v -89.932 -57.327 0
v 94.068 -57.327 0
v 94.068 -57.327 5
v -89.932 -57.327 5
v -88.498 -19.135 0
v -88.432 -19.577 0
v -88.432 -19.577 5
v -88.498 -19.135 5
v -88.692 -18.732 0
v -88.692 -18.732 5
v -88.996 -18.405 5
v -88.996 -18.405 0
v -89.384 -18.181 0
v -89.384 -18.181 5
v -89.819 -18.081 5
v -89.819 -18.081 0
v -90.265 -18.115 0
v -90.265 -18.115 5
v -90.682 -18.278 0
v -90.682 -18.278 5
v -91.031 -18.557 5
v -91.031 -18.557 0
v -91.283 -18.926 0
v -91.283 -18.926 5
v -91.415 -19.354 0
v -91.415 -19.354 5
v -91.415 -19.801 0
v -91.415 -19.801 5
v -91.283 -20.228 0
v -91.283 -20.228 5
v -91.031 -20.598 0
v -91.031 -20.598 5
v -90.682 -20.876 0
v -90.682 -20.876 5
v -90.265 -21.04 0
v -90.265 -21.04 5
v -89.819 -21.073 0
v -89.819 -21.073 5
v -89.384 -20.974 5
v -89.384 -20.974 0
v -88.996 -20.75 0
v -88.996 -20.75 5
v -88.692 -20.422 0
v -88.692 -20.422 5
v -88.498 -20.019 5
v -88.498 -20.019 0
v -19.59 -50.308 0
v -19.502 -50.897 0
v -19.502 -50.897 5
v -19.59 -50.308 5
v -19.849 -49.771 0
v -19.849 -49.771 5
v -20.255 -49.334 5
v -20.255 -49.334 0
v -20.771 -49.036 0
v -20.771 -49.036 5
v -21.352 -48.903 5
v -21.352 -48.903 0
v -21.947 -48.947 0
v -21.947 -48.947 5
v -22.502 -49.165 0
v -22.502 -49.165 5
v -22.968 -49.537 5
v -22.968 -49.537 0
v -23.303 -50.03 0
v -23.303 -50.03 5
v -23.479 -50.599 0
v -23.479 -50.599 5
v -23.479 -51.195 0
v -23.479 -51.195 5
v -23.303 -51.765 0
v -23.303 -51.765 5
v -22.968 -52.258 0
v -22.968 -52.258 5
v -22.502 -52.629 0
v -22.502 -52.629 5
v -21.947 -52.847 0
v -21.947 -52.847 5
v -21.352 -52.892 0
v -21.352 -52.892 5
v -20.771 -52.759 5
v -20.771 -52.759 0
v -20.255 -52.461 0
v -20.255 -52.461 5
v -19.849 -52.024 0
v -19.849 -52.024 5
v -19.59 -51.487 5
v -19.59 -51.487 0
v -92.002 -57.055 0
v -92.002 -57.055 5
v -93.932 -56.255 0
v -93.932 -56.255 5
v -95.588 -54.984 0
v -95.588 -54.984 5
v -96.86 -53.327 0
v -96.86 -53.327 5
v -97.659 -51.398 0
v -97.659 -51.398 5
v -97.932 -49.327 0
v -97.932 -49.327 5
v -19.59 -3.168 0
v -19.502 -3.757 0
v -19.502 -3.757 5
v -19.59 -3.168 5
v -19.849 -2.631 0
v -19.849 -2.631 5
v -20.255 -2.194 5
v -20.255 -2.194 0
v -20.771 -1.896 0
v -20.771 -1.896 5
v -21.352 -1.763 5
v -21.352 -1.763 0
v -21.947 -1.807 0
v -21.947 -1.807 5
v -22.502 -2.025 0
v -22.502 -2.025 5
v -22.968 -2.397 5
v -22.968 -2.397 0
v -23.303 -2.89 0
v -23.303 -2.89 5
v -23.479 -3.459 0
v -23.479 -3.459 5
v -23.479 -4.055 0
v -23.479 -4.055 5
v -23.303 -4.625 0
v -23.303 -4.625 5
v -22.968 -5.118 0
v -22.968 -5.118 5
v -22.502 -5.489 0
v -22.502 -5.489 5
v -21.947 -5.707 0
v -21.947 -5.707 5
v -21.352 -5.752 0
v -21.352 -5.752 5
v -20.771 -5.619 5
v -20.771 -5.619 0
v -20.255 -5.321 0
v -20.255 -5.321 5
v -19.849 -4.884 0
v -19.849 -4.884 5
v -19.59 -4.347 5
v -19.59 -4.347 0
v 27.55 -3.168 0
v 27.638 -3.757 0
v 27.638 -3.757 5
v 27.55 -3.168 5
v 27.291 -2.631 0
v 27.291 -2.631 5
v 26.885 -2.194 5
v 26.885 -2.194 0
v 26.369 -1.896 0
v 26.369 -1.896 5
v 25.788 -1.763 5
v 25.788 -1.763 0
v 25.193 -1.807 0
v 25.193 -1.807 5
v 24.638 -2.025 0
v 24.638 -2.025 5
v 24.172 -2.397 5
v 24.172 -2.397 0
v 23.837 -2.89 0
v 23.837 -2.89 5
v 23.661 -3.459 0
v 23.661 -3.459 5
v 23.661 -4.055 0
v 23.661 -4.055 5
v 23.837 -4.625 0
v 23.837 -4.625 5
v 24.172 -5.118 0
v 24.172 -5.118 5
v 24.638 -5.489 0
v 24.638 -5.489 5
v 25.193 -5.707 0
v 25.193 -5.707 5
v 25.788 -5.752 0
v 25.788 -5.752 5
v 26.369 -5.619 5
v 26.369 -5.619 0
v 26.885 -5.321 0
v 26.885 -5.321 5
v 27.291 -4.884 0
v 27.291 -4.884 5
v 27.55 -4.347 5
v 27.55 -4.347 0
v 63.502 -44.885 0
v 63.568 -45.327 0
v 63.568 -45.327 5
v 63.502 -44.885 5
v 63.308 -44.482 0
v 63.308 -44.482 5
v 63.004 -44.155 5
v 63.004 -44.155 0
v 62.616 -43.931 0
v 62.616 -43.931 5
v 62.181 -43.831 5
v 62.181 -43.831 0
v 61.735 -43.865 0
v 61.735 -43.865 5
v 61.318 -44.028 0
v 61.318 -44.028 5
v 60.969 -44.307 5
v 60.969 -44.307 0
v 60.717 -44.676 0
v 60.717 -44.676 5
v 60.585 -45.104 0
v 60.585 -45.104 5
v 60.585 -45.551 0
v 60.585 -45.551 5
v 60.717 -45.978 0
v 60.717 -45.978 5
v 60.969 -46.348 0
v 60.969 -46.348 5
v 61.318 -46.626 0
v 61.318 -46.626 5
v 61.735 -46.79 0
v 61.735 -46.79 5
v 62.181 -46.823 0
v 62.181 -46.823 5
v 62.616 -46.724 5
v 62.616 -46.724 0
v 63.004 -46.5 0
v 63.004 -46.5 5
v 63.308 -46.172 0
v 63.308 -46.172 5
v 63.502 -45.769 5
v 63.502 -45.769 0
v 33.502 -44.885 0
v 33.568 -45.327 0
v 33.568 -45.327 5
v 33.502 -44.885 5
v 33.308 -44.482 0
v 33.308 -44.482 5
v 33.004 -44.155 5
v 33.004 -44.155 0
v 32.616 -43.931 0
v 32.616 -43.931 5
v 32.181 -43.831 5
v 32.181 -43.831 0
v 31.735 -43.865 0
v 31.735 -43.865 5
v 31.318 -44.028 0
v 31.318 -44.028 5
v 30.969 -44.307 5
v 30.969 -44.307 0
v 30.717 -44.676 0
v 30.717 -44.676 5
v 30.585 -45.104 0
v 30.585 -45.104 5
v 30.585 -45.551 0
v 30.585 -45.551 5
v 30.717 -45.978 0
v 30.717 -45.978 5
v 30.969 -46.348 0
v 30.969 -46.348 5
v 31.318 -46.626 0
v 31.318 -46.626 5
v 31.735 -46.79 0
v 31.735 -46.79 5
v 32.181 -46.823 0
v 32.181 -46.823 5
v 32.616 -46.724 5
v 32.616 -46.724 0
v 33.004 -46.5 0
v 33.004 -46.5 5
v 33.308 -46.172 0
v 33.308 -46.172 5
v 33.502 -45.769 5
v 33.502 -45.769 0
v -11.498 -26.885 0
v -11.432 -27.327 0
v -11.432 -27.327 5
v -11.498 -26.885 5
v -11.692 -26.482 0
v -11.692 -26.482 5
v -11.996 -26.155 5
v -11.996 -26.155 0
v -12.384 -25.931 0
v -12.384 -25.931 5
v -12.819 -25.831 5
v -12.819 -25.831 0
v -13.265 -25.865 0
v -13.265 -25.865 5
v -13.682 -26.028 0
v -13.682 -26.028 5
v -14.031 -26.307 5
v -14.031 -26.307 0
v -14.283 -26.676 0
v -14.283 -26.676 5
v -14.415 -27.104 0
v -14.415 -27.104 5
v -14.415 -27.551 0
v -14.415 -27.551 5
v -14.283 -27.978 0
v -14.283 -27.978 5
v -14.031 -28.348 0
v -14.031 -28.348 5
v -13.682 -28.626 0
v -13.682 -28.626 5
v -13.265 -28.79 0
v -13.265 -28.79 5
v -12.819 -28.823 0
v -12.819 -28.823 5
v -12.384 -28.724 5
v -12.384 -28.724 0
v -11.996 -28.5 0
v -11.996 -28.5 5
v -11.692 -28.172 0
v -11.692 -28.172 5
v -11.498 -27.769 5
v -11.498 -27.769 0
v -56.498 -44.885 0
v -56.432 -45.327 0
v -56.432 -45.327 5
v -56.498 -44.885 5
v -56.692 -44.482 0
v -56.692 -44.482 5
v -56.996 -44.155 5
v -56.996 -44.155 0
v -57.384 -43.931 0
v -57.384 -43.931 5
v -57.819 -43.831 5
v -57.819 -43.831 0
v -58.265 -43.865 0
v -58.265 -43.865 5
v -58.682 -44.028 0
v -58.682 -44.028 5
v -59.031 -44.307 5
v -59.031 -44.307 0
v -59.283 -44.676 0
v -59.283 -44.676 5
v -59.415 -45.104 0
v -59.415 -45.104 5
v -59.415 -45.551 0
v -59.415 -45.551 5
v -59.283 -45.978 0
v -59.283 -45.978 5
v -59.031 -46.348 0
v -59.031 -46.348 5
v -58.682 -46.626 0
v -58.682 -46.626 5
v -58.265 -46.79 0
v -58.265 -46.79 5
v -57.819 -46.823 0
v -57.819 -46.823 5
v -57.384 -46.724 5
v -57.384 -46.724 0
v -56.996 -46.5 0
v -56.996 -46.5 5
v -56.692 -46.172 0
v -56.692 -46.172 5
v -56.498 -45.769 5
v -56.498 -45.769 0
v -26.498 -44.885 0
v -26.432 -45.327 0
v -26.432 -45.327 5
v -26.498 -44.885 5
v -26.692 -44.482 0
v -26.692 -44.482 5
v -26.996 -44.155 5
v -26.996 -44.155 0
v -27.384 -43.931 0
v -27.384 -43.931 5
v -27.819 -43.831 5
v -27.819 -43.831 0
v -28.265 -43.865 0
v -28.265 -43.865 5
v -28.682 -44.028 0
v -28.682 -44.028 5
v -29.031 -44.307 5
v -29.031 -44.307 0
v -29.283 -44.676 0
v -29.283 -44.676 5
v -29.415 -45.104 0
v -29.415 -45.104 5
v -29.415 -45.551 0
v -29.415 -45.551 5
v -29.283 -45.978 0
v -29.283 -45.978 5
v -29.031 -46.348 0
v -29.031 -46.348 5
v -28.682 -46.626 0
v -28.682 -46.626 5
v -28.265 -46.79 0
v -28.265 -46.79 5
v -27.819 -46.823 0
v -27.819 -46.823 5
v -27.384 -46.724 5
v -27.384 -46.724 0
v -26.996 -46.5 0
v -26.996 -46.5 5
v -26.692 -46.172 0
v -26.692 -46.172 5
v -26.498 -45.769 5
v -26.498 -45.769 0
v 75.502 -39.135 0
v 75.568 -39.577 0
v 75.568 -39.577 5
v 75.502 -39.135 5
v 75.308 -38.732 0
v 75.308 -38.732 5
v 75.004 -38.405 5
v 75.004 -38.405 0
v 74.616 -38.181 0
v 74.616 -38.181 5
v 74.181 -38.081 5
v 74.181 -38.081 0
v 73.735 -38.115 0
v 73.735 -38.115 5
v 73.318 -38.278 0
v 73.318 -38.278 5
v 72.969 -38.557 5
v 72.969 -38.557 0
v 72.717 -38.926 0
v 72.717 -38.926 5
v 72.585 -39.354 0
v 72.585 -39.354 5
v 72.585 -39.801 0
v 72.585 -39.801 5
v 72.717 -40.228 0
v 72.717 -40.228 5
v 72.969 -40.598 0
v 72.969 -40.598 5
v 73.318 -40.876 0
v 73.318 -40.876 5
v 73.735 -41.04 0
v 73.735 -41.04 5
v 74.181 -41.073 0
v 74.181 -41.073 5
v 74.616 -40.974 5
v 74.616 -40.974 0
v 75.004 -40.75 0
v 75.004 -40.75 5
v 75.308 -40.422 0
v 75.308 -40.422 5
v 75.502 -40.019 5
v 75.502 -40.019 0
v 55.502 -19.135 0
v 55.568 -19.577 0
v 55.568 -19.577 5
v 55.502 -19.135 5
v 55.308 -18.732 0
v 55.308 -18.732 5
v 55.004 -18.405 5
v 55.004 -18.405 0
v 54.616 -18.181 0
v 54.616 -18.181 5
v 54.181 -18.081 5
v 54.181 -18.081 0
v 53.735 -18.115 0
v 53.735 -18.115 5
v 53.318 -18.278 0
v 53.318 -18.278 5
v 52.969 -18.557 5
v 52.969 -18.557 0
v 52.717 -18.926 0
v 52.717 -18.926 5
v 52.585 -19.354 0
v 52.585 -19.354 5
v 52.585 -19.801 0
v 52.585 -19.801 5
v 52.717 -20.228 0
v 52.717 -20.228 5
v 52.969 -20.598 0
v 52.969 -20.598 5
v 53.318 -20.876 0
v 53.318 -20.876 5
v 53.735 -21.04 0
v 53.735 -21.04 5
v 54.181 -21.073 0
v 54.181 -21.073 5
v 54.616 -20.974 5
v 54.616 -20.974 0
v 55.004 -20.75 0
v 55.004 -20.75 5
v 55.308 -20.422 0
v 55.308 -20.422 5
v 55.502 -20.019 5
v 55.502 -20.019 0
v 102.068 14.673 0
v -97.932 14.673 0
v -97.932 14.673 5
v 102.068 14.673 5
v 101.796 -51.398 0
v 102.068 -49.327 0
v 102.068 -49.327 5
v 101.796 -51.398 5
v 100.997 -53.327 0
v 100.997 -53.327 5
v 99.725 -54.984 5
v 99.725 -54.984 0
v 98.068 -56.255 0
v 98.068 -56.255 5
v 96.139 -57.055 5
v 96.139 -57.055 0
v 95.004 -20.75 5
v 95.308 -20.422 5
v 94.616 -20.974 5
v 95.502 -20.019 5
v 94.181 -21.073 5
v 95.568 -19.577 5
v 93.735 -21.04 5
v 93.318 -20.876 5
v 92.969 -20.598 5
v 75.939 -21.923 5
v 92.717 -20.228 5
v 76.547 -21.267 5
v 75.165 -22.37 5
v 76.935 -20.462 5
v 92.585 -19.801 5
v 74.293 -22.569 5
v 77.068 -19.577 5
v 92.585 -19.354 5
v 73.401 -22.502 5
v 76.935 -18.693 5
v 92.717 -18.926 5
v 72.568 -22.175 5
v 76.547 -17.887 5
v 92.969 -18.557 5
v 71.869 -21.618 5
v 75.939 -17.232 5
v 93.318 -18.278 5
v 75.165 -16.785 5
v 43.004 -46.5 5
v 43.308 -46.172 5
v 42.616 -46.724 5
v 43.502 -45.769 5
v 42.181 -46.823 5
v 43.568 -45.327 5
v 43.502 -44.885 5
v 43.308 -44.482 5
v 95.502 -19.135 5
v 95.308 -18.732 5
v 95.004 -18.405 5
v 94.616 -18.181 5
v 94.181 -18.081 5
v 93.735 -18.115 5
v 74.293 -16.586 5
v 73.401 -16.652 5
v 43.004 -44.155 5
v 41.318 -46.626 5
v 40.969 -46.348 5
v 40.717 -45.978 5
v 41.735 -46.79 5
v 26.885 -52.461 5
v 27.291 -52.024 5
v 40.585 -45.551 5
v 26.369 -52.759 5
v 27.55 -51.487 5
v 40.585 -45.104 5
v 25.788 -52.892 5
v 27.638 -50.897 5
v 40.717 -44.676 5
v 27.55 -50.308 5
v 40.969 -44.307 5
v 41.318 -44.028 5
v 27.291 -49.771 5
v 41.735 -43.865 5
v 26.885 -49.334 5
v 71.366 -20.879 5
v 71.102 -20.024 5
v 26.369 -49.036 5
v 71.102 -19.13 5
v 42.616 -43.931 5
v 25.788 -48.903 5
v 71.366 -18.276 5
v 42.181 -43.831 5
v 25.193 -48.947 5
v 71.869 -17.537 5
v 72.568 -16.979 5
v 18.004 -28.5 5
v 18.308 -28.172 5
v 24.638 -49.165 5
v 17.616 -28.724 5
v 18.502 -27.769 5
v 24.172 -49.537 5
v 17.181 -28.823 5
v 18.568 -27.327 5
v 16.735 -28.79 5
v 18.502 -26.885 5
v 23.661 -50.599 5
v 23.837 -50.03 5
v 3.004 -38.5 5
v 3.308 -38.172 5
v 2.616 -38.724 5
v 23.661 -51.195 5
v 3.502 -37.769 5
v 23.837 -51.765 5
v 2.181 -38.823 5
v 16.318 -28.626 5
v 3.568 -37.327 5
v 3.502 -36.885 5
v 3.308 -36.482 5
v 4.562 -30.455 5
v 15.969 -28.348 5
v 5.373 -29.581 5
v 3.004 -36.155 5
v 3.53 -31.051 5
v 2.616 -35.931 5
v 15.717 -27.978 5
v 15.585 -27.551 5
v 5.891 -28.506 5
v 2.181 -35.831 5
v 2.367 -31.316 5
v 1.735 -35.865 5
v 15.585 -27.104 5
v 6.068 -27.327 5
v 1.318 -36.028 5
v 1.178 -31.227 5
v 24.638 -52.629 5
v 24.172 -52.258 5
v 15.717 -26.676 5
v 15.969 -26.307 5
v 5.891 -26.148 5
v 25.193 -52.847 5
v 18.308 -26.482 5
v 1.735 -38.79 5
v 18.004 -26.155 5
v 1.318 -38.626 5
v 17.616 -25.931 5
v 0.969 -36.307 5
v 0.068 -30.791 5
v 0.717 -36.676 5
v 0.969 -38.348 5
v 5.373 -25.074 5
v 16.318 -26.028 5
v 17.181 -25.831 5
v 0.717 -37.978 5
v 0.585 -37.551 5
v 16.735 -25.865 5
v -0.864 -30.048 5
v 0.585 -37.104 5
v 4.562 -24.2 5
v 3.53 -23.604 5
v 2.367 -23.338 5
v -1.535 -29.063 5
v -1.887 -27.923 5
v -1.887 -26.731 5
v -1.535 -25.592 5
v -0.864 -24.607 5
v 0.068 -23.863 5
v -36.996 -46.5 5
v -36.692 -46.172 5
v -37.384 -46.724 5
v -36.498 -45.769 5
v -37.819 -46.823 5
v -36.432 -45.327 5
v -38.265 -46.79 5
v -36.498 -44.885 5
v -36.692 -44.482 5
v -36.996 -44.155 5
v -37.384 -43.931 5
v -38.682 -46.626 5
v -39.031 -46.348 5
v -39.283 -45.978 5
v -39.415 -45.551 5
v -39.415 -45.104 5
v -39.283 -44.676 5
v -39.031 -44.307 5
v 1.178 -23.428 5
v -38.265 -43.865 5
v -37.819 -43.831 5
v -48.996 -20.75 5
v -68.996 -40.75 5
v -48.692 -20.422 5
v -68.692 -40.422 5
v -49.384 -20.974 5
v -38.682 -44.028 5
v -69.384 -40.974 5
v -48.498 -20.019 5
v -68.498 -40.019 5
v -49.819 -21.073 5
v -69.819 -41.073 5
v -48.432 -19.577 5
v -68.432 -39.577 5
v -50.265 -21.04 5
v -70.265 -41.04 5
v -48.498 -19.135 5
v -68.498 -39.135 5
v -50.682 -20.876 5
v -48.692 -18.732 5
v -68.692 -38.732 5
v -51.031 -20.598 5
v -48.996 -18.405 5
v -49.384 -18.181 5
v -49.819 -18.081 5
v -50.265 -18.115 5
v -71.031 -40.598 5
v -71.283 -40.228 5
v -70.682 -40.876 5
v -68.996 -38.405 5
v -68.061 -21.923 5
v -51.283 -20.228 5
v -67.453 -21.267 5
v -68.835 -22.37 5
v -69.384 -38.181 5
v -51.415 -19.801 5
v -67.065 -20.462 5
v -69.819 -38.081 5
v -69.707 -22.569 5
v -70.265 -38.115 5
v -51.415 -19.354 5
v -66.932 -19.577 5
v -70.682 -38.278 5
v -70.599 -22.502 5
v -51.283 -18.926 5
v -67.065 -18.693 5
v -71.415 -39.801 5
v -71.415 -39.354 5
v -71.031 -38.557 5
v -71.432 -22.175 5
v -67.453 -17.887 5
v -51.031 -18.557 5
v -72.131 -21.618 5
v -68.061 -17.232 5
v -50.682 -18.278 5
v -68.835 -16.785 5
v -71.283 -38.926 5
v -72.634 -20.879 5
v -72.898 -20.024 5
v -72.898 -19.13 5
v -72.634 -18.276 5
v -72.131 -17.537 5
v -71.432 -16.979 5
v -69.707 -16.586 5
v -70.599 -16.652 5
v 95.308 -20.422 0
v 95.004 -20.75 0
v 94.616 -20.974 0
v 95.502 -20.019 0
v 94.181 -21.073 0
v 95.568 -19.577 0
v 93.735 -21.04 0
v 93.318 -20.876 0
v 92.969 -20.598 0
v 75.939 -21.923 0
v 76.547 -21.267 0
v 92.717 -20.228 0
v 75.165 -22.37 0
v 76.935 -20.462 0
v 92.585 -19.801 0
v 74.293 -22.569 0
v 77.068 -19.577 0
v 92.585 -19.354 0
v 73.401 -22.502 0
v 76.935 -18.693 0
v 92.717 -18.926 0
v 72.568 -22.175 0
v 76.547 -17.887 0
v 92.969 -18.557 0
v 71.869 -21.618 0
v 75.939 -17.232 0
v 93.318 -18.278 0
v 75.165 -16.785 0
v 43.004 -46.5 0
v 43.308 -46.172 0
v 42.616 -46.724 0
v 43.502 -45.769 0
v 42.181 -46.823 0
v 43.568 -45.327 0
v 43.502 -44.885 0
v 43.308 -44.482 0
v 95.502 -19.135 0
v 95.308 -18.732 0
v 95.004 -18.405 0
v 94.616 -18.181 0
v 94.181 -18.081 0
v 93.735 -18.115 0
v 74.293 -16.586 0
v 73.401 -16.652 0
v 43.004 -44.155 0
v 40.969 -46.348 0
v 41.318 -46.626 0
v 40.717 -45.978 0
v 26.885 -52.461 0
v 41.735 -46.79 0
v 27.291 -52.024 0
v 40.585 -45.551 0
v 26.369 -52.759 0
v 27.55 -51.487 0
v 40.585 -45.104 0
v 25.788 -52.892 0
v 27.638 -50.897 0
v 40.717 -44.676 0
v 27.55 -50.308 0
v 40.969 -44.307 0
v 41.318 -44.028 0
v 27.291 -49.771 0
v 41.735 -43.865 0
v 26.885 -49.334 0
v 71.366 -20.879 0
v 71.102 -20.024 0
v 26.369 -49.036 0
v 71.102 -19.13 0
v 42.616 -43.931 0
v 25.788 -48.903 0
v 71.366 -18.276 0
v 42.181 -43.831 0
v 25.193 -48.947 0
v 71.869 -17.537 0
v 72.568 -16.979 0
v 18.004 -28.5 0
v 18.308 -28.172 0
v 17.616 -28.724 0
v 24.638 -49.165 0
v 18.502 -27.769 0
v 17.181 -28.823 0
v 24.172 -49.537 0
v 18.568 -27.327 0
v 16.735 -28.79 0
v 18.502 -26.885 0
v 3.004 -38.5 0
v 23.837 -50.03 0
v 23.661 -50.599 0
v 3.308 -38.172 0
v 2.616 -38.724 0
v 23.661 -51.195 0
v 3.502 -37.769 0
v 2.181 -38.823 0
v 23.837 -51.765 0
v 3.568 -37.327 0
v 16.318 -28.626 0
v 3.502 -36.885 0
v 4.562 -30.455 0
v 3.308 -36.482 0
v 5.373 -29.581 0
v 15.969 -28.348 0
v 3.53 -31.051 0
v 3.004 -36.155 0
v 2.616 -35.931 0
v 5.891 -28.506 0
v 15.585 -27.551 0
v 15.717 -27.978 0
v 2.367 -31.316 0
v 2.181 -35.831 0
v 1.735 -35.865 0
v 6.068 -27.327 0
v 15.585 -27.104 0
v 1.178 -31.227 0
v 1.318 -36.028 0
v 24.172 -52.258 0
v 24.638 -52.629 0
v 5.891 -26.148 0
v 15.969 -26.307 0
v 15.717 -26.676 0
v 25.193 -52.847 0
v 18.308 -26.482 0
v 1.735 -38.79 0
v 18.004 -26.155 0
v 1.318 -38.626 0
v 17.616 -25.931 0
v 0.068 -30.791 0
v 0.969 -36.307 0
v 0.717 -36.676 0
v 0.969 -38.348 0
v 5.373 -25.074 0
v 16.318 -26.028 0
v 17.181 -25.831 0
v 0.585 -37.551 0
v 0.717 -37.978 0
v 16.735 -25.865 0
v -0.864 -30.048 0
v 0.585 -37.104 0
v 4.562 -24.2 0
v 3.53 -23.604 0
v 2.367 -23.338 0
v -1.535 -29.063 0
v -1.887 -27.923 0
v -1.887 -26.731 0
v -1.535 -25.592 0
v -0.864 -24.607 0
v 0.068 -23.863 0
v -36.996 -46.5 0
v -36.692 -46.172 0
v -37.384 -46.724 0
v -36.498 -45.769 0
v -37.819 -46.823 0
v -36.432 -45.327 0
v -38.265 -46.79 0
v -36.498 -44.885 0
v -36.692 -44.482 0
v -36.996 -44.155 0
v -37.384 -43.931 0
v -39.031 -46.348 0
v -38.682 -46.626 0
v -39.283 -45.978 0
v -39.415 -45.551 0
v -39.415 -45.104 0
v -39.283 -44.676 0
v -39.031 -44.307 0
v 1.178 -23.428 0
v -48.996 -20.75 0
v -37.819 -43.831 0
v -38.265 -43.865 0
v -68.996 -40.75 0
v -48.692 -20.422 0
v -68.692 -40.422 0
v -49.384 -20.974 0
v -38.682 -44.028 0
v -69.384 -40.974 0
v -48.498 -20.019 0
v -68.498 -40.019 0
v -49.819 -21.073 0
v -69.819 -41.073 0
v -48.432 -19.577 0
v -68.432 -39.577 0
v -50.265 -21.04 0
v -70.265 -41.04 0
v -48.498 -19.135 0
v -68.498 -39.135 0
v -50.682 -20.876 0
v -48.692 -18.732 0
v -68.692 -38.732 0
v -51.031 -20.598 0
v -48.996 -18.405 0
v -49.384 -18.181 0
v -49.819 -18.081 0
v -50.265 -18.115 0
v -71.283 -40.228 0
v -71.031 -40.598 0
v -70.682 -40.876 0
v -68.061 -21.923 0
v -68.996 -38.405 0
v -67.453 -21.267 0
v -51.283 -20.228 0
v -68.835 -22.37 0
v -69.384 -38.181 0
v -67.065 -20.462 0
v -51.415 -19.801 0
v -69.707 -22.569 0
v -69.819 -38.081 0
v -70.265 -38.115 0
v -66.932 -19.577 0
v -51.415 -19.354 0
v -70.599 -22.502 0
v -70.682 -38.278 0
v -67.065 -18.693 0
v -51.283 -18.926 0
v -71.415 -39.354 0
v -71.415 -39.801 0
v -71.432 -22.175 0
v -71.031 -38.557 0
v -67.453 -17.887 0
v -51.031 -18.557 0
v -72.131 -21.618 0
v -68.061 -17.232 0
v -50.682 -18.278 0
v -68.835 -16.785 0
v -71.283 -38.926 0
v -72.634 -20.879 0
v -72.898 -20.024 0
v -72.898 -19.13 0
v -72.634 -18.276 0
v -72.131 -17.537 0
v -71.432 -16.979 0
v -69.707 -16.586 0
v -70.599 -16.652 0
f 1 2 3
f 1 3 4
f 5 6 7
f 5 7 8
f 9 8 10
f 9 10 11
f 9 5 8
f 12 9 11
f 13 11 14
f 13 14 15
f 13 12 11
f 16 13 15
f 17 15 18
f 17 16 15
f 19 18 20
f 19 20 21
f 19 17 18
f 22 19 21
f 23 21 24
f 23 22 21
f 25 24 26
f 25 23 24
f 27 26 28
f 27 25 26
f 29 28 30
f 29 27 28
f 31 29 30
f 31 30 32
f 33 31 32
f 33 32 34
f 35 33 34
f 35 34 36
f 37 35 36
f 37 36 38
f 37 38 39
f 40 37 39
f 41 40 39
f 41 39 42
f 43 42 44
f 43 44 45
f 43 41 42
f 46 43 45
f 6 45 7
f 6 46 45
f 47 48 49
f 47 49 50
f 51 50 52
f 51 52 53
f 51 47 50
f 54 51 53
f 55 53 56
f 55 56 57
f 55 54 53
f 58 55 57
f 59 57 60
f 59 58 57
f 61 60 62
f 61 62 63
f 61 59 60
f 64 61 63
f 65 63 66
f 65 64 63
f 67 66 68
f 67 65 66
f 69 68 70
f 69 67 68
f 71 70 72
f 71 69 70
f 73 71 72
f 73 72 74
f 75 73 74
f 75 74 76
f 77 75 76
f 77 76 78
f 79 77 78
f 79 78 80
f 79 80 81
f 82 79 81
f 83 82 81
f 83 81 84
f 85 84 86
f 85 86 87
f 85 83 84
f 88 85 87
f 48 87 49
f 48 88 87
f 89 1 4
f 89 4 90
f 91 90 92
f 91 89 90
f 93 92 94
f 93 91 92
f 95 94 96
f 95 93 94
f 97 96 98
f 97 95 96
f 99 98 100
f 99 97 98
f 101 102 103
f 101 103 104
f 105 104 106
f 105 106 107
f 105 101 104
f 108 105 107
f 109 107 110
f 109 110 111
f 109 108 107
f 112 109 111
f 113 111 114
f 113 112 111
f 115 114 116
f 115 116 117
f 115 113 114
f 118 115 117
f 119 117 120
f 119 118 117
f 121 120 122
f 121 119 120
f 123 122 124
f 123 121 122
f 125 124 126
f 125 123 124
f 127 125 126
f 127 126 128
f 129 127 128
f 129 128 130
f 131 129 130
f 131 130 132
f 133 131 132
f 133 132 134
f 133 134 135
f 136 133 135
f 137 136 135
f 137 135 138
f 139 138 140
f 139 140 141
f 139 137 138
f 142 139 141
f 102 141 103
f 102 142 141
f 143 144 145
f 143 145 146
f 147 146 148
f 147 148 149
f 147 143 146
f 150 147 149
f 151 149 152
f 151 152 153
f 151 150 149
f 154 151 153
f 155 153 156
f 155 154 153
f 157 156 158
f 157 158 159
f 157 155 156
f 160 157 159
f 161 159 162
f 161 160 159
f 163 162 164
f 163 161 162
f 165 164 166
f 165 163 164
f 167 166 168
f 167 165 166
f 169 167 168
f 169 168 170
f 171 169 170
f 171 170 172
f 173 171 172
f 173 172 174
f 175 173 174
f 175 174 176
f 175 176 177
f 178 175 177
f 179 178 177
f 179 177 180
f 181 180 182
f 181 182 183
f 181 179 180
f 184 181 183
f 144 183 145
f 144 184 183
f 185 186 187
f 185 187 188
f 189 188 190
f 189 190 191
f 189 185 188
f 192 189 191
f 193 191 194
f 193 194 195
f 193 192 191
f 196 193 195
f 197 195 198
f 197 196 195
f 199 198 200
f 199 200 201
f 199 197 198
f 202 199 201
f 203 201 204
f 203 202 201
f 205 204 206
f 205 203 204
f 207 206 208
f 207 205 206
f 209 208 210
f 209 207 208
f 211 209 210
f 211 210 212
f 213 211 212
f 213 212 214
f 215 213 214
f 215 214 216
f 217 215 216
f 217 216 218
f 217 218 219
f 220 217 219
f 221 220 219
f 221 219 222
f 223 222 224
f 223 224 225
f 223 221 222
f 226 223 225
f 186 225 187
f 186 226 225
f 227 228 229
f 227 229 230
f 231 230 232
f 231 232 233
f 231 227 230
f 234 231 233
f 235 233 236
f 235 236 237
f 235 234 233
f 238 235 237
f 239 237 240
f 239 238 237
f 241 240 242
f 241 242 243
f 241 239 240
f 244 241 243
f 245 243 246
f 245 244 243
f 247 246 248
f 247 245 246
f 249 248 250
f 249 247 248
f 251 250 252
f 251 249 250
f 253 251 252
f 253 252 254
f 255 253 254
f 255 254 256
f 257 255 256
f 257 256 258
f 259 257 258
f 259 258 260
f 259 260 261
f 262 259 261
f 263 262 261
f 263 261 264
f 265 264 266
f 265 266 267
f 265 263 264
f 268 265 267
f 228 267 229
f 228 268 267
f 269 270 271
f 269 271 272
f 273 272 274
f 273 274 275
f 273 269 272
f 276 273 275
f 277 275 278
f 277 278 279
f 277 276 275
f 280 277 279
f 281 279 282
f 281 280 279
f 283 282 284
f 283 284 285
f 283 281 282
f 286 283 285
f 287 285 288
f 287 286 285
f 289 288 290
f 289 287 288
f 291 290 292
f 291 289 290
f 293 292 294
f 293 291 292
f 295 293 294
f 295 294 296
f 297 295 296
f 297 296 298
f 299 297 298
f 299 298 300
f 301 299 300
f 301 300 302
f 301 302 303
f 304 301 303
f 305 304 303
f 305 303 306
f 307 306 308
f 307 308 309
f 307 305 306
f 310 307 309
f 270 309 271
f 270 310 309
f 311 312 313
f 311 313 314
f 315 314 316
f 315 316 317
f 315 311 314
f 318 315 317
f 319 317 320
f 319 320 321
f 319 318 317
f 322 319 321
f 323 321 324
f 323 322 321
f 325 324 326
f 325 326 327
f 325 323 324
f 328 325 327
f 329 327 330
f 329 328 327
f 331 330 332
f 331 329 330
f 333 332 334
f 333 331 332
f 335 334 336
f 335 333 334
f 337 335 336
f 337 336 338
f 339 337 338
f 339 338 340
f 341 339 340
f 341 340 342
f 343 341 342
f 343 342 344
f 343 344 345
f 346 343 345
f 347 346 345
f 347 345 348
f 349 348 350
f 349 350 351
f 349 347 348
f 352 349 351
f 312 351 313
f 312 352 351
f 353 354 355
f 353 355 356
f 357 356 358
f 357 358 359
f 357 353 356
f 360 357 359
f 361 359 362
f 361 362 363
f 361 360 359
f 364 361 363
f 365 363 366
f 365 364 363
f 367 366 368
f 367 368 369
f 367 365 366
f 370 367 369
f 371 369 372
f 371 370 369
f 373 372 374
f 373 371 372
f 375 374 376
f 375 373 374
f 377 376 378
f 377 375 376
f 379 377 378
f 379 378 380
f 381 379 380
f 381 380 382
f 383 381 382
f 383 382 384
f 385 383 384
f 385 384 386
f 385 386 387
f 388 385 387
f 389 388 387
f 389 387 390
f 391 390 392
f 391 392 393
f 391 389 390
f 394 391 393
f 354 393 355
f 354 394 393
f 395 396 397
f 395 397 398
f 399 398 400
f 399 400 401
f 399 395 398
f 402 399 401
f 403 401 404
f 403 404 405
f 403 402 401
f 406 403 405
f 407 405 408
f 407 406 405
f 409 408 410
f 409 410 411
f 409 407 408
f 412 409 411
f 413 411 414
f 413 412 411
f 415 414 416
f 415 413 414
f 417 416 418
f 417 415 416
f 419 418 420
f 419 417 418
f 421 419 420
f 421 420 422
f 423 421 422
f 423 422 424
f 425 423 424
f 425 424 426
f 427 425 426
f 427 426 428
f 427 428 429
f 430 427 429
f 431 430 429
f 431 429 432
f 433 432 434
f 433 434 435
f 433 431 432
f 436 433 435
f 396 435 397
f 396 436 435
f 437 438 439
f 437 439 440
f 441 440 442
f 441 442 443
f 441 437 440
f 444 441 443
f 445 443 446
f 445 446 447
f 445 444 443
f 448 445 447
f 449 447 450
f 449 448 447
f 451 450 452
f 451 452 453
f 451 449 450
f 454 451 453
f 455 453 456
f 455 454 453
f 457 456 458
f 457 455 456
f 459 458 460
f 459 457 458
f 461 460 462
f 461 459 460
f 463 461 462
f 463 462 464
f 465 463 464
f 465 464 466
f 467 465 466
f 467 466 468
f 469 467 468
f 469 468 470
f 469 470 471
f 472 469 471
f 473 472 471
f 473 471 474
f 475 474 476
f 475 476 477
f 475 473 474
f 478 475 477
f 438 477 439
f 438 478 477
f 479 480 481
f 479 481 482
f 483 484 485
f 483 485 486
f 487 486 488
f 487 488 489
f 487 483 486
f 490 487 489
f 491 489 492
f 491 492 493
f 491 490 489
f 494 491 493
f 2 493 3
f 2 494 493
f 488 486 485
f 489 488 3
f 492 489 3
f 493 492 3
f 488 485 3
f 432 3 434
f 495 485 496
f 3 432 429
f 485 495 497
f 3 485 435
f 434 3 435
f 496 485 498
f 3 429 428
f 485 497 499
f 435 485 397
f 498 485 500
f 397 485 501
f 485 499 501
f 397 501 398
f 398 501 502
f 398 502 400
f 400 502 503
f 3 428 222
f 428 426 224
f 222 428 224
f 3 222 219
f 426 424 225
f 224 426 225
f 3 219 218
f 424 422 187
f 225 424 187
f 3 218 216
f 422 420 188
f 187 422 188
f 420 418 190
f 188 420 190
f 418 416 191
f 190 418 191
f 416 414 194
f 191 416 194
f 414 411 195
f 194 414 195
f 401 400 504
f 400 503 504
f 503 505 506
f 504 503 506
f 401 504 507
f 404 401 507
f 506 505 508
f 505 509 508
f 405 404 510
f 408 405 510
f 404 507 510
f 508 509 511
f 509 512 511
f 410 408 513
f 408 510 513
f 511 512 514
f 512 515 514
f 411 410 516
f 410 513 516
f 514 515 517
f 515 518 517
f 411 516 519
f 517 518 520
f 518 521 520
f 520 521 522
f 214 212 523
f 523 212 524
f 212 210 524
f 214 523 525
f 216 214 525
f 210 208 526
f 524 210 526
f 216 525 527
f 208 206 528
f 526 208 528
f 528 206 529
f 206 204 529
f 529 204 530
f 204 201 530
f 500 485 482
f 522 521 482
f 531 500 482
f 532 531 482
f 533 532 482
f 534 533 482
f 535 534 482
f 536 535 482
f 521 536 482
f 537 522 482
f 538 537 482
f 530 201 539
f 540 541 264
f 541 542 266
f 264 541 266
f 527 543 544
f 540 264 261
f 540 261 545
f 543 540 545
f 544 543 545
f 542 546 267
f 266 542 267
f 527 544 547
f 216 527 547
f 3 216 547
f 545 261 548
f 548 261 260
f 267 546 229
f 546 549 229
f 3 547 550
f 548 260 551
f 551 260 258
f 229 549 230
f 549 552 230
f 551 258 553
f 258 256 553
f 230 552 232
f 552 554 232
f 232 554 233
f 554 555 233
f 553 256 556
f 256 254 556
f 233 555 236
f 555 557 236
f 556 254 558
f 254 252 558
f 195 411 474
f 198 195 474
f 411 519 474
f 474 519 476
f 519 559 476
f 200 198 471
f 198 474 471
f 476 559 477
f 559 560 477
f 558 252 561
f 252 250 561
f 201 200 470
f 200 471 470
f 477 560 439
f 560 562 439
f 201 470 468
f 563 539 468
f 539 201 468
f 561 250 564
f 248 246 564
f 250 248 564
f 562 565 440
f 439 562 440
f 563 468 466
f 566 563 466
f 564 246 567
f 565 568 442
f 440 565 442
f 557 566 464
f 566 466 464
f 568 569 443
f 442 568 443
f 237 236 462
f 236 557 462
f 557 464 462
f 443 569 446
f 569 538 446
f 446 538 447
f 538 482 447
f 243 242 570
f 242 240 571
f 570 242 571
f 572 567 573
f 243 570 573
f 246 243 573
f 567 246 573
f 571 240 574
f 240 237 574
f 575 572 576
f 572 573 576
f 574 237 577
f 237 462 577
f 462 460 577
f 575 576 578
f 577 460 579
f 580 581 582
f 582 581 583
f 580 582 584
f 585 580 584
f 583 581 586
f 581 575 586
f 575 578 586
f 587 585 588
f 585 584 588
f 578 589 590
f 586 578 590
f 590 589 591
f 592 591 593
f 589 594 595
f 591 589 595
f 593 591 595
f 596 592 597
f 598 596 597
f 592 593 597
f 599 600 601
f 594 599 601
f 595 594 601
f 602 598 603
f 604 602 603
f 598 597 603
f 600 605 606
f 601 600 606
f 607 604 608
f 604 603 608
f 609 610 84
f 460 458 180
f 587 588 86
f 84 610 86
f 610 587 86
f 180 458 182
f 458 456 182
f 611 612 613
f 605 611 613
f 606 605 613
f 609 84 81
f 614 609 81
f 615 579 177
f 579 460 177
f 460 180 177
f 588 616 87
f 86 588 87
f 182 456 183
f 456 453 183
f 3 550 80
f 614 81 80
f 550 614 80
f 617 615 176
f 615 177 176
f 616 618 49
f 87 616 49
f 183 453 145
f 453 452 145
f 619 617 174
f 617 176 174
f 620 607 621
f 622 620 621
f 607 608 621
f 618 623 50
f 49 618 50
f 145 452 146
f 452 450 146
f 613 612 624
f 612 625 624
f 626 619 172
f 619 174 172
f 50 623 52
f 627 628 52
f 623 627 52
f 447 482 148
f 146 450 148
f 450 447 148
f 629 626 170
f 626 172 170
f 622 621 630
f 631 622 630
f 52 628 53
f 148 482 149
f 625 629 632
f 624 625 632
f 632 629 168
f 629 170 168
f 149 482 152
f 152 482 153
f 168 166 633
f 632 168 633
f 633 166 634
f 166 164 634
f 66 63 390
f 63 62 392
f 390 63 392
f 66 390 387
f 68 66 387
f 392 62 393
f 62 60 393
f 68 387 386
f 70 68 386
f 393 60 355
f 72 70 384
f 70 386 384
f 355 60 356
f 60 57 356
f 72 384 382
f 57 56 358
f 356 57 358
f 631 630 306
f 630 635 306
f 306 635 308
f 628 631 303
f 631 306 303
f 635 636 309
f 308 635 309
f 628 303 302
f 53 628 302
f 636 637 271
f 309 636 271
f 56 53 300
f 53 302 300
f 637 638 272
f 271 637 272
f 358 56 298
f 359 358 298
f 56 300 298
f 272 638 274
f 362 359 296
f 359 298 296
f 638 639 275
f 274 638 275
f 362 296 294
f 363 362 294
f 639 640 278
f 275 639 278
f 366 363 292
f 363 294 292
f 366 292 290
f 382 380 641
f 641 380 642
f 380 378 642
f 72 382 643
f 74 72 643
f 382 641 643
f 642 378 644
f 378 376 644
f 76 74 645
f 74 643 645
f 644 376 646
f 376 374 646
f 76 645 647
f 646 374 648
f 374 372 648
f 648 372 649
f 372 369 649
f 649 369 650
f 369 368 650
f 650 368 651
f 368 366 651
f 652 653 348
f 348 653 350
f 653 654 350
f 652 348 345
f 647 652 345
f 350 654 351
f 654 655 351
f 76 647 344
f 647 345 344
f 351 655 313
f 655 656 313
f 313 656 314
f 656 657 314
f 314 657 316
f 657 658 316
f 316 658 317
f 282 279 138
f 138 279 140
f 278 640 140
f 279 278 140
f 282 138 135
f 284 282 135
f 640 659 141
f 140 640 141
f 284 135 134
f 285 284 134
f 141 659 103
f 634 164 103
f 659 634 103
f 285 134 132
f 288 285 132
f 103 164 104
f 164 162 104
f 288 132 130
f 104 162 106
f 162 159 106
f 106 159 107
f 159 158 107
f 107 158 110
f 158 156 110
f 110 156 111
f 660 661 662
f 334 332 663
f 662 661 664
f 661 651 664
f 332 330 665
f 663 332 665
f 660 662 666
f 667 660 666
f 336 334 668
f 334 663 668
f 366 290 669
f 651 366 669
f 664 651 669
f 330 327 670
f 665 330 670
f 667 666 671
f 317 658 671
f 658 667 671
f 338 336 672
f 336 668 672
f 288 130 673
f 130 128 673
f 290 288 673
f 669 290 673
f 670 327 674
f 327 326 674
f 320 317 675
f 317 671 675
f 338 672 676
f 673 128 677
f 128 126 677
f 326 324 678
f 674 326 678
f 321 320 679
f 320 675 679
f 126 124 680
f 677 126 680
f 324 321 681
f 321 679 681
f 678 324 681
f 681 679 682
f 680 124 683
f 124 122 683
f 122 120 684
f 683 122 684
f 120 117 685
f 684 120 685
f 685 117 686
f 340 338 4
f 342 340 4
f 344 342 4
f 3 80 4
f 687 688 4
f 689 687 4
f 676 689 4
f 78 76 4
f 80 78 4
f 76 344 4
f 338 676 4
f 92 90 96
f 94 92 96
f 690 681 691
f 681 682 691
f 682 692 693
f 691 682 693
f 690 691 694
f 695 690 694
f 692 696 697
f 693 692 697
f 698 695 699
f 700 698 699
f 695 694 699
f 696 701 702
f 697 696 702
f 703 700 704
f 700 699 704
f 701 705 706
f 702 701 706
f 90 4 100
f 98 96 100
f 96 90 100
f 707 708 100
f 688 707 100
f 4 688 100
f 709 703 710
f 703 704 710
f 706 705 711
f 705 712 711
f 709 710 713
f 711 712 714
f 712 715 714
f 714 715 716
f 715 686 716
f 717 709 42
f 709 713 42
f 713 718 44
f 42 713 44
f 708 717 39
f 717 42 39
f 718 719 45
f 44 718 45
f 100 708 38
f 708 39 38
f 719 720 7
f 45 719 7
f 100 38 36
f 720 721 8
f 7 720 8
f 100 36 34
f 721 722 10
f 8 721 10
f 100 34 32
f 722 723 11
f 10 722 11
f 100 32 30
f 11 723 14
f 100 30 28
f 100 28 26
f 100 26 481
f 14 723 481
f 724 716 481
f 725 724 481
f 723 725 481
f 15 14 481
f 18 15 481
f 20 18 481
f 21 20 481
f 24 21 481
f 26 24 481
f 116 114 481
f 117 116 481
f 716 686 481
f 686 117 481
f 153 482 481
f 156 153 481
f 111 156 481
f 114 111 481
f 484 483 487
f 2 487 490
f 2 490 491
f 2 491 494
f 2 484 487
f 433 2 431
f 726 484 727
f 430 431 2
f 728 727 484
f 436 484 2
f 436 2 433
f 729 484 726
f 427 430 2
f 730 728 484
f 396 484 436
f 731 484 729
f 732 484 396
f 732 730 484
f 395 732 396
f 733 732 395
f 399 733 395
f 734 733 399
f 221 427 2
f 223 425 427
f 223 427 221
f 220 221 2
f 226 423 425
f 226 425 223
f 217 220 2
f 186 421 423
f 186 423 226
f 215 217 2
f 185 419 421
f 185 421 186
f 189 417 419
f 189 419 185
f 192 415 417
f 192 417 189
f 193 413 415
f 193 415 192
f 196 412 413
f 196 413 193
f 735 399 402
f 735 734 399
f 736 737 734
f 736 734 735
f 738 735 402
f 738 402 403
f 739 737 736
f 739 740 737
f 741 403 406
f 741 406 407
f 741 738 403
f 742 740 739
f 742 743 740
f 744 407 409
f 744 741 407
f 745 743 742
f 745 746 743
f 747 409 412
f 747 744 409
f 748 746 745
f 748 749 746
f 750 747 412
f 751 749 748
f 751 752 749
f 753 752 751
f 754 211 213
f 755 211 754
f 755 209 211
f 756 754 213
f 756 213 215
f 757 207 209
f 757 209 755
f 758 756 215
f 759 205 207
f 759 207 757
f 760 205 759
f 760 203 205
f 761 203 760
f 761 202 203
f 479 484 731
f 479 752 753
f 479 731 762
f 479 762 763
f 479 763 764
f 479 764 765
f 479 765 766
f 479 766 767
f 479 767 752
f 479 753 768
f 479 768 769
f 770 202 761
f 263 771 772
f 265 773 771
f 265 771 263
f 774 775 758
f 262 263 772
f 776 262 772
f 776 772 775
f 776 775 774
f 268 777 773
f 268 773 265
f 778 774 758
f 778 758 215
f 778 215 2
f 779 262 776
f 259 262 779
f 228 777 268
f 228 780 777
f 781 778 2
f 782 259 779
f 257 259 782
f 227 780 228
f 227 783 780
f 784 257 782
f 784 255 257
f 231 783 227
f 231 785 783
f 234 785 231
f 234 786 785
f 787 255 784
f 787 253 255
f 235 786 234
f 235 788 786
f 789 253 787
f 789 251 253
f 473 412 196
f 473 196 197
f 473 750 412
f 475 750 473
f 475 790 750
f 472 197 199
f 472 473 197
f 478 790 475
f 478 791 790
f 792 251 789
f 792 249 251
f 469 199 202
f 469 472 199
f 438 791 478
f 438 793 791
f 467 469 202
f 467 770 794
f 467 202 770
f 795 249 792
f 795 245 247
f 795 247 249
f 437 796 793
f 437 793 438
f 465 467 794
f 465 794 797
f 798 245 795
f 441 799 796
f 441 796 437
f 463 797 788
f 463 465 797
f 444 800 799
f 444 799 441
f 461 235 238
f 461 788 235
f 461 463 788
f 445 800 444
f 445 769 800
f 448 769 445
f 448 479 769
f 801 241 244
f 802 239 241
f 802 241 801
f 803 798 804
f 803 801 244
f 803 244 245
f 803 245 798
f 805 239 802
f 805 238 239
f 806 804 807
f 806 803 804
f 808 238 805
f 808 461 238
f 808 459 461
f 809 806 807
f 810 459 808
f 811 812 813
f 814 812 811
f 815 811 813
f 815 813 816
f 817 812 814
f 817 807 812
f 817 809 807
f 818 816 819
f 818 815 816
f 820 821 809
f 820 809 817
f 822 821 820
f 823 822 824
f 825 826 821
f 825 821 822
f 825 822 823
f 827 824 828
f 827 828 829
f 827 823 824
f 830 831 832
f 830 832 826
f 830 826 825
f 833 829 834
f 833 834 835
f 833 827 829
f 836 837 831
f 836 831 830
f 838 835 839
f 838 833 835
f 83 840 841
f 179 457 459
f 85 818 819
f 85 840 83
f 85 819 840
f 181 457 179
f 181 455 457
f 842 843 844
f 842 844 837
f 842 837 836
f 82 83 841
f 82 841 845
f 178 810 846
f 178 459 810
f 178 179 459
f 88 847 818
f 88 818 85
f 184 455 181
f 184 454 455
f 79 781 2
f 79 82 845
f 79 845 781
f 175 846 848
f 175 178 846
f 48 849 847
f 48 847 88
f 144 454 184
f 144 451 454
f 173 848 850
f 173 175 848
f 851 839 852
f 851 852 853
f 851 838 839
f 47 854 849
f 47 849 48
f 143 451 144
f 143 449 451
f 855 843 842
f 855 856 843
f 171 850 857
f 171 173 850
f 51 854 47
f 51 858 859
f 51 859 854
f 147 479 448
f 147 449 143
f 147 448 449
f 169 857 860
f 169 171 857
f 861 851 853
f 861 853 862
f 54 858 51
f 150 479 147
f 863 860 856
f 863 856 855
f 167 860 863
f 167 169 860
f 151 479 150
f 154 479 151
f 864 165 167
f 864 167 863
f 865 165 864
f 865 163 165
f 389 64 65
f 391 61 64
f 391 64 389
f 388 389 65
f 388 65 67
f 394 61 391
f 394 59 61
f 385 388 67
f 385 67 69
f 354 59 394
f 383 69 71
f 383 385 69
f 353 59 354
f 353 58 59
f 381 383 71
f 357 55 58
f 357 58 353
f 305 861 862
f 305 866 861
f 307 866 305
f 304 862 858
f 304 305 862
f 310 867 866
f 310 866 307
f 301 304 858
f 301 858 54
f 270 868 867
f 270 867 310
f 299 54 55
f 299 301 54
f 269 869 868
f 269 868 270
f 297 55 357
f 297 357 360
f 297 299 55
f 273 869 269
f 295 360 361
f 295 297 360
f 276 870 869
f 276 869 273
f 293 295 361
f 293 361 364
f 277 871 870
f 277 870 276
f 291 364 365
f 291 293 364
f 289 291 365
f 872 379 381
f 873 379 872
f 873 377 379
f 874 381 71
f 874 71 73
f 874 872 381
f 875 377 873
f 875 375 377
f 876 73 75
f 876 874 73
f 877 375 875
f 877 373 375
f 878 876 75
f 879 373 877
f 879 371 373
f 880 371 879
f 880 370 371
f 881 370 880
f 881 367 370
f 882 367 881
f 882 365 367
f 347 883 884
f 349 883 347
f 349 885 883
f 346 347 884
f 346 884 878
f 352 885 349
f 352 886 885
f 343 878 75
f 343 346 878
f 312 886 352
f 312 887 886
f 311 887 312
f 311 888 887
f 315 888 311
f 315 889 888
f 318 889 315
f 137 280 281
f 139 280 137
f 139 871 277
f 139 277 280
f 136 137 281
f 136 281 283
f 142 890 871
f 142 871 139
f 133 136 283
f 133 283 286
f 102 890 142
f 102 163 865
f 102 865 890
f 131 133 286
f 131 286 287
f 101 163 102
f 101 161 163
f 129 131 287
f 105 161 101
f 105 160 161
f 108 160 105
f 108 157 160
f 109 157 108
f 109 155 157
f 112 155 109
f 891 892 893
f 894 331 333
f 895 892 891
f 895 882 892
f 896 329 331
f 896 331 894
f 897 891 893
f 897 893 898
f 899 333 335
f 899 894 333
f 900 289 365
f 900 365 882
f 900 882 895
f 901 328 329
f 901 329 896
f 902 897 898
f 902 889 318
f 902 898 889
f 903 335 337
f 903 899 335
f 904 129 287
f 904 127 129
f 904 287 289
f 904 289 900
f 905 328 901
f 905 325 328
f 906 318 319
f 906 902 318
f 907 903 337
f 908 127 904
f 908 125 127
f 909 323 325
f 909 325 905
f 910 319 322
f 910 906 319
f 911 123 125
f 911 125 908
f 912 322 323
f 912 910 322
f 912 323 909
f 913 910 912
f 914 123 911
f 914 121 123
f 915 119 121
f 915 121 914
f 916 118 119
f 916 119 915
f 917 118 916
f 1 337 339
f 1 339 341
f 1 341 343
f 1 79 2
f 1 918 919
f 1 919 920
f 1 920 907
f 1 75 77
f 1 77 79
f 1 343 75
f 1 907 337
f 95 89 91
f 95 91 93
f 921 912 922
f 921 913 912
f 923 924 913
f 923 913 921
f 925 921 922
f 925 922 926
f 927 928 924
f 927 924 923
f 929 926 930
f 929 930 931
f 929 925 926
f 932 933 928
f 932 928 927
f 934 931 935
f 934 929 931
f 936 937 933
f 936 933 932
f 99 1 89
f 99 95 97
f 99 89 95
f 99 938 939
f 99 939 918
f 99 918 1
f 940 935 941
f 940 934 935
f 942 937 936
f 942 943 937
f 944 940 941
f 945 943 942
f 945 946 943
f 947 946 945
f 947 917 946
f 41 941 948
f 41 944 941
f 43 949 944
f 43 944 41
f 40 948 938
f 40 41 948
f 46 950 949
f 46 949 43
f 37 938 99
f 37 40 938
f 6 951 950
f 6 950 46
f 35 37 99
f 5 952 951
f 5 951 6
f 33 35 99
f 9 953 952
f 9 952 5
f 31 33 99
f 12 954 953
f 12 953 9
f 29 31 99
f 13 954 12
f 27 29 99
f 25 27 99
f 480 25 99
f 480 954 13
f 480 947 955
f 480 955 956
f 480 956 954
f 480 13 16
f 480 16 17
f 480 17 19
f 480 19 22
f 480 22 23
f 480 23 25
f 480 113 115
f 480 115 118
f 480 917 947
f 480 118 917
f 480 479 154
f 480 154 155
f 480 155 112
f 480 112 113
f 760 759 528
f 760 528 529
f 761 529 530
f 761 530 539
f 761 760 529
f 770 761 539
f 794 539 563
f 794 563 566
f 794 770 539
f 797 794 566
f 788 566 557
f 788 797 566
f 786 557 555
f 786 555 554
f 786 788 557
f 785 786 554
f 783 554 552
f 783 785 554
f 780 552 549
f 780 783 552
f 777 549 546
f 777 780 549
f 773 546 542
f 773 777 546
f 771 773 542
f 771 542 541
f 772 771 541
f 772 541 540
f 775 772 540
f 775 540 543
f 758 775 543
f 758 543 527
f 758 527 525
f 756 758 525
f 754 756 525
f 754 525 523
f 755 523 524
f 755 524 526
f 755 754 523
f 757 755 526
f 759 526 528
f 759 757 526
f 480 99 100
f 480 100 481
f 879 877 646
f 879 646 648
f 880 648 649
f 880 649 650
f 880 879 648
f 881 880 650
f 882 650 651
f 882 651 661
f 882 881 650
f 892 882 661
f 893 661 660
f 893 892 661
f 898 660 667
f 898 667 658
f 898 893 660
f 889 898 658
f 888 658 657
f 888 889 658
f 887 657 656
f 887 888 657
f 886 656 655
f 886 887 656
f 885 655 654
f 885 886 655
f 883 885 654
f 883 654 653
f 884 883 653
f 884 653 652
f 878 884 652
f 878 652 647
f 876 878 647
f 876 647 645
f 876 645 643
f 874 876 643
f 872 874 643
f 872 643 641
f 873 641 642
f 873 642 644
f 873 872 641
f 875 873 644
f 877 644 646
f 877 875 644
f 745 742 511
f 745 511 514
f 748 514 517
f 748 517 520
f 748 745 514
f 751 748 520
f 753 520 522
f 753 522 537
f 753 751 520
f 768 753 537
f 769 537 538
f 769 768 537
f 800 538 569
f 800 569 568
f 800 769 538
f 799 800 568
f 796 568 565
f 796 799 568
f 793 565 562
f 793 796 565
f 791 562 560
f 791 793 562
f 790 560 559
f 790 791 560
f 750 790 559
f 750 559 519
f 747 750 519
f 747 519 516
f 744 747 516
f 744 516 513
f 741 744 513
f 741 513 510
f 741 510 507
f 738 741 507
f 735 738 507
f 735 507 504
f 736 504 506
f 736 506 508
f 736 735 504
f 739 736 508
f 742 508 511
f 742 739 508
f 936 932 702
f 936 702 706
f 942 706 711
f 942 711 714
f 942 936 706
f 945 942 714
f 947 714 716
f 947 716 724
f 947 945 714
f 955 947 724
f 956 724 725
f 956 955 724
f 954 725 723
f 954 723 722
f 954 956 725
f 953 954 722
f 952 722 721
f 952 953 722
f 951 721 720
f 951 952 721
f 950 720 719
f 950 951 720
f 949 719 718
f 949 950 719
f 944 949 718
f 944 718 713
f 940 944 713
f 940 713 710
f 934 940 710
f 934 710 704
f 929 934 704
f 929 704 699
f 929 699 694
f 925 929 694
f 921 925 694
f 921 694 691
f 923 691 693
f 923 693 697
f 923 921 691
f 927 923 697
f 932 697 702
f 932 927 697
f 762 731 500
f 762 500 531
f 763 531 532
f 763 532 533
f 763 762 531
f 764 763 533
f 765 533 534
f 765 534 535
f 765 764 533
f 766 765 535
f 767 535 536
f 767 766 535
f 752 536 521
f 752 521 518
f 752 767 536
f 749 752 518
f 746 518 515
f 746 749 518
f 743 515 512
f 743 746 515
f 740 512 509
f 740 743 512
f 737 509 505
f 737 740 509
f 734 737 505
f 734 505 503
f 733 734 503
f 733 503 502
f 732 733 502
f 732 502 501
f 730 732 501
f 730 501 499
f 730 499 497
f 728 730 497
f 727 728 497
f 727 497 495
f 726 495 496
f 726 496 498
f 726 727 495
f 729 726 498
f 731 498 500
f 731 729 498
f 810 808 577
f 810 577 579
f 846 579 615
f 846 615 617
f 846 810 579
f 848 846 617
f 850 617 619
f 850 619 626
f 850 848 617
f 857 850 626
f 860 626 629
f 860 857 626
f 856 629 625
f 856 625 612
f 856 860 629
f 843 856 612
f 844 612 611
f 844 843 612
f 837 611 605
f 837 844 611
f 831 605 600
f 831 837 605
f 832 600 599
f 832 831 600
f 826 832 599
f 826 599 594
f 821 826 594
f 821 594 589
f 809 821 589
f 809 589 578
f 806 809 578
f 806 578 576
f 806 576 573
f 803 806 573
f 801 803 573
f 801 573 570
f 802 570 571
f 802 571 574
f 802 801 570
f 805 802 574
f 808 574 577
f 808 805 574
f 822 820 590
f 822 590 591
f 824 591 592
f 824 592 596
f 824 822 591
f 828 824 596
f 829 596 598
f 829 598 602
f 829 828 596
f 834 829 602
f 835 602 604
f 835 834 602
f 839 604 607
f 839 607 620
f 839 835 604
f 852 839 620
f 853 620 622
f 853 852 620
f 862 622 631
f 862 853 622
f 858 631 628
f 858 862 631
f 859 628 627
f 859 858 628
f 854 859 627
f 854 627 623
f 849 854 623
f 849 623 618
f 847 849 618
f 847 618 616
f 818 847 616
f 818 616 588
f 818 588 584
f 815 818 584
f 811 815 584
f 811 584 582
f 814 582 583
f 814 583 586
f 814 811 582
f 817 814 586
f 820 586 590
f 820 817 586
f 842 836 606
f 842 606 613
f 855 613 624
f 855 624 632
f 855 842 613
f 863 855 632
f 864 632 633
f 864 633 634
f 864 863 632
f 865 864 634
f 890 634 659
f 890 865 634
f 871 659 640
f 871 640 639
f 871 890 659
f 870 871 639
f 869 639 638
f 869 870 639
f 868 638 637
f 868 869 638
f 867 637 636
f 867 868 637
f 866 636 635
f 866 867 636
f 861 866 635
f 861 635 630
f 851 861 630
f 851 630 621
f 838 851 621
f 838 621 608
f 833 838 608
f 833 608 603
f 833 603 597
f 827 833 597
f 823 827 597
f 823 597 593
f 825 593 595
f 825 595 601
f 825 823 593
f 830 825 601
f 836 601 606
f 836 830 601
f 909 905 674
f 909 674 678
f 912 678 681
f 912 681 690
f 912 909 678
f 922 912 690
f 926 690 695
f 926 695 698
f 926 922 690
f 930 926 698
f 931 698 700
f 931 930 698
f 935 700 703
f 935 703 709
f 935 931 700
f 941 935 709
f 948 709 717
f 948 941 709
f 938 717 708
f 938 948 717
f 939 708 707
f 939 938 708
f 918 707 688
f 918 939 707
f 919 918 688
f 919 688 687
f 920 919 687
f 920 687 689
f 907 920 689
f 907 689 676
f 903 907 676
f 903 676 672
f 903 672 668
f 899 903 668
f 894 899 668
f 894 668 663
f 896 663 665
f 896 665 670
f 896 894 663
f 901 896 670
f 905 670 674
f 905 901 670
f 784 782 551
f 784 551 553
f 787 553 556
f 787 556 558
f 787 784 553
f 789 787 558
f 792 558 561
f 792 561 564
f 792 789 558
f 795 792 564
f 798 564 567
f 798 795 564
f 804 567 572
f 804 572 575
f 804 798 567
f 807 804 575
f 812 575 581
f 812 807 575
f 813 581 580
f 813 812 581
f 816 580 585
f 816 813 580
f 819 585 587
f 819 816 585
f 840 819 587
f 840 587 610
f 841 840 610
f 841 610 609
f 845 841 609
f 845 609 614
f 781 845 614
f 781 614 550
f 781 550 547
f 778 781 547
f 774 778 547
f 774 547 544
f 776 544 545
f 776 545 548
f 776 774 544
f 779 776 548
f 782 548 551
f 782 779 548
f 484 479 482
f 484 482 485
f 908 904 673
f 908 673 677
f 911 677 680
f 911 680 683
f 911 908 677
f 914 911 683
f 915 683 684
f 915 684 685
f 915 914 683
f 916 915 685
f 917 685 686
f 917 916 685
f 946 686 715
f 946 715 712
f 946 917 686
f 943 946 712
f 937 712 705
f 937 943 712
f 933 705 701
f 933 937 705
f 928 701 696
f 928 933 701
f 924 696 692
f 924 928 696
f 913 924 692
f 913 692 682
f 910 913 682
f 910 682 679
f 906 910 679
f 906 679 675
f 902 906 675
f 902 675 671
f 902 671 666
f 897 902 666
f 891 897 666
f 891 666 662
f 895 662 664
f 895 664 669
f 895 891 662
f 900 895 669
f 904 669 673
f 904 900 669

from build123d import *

# Parameters (mm, degrees)
CROQUIS1_R              = 4
CROQUIS1_R_2            = 3
CROQUIS1_R_3            = 1.5
CROQUIS1_R_4            = 2
SALIENTE_EXTRUIR1_DEPTH = 5


with BuildPart() as part:
    # Croquis1 → Saliente-Extruir1 (new body)
    with BuildSketch(Plane.XY):
        with BuildLine():
            Line((102.068487159, -0.327277931), (102.068487159, -49.327277931))
            ThreePointArc((102.068487159, -49.327277931), (99.725341409, -54.98413218), (94.068487159, -57.327277931))
            Line((94.068487159, -57.327277931), (-89.931512841, -57.327277931))
            ThreePointArc((-89.931512841, -57.327277931), (-95.58836709, -54.98413218), (-97.931512841, -49.327277931))
            Line((-97.931512841, -49.327277931), (-97.931512841, -0.327277931))
            Line((-97.931512841, -0.327277931), (-97.931512841, 14.672722069))
            Line((-97.931512841, 14.672722069), (102.068487159, 14.672722069))
            Line((102.068487159, 14.672722069), (102.068487159, -0.327277931))
        make_face()
        with Locations((2.068487159, -27.327277931)):
            Circle(CROQUIS1_R, mode=Mode.SUBTRACT)
        with Locations((74.068487159, -19.577277931)):
            Circle(CROQUIS1_R_2, mode=Mode.SUBTRACT)
        with Locations((-69.931512841, -19.577277931)):
            Circle(CROQUIS1_R_2, mode=Mode.SUBTRACT)
        with Locations((74.068487159, -39.577277931)):
            Circle(CROQUIS1_R_3, mode=Mode.SUBTRACT)
        with Locations((54.068487159, -19.577277931)):
            Circle(CROQUIS1_R_3, mode=Mode.SUBTRACT)
        with Locations((94.068487159, -19.577277931)):
            Circle(CROQUIS1_R_3, mode=Mode.SUBTRACT)
        with Locations((-69.931512841, -39.577277931)):
            Circle(CROQUIS1_R_3, mode=Mode.SUBTRACT)
        with Locations((-89.931512841, -19.577277931)):
            Circle(CROQUIS1_R_3, mode=Mode.SUBTRACT)
        with Locations((-49.931512841, -19.577277931)):
            Circle(CROQUIS1_R_3, mode=Mode.SUBTRACT)
        with Locations((42.068487159, -45.327277931)):
            Circle(CROQUIS1_R_3, mode=Mode.SUBTRACT)
        with Locations((62.068487159, -45.327277931)):
            Circle(CROQUIS1_R_3, mode=Mode.SUBTRACT)
        with Locations((-57.931512841, -45.327277931)):
            Circle(CROQUIS1_R_3, mode=Mode.SUBTRACT)
        with Locations((-37.931512841, -45.327277931)):
            Circle(CROQUIS1_R_3, mode=Mode.SUBTRACT)
        with Locations((-12.931512841, -27.327277931)):
            Circle(CROQUIS1_R_3, mode=Mode.SUBTRACT)
        with Locations((17.068487159, -27.327277931)):
            Circle(CROQUIS1_R_3, mode=Mode.SUBTRACT)
        with Locations((2.068487159, -37.327277931)):
            Circle(CROQUIS1_R_3, mode=Mode.SUBTRACT)
        with Locations((-21.501512841, -3.757277931)):
            Circle(CROQUIS1_R_4, mode=Mode.SUBTRACT)
        with Locations((25.638487159, -3.757277931)):
            Circle(CROQUIS1_R_4, mode=Mode.SUBTRACT)
        with Locations((25.638487159, -50.897277931)):
            Circle(CROQUIS1_R_4, mode=Mode.SUBTRACT)
        with Locations((-21.501512841, -50.897277931)):
            Circle(CROQUIS1_R_4, mode=Mode.SUBTRACT)
        with Locations((32.068487159, -45.327277931)):
            Circle(CROQUIS1_R_3, mode=Mode.SUBTRACT)
        with Locations((-27.931512841, -45.327277931)):
            Circle(CROQUIS1_R_3, mode=Mode.SUBTRACT)
    extrude(amount=SALIENTE_EXTRUIR1_DEPTH)


solid = part.part
